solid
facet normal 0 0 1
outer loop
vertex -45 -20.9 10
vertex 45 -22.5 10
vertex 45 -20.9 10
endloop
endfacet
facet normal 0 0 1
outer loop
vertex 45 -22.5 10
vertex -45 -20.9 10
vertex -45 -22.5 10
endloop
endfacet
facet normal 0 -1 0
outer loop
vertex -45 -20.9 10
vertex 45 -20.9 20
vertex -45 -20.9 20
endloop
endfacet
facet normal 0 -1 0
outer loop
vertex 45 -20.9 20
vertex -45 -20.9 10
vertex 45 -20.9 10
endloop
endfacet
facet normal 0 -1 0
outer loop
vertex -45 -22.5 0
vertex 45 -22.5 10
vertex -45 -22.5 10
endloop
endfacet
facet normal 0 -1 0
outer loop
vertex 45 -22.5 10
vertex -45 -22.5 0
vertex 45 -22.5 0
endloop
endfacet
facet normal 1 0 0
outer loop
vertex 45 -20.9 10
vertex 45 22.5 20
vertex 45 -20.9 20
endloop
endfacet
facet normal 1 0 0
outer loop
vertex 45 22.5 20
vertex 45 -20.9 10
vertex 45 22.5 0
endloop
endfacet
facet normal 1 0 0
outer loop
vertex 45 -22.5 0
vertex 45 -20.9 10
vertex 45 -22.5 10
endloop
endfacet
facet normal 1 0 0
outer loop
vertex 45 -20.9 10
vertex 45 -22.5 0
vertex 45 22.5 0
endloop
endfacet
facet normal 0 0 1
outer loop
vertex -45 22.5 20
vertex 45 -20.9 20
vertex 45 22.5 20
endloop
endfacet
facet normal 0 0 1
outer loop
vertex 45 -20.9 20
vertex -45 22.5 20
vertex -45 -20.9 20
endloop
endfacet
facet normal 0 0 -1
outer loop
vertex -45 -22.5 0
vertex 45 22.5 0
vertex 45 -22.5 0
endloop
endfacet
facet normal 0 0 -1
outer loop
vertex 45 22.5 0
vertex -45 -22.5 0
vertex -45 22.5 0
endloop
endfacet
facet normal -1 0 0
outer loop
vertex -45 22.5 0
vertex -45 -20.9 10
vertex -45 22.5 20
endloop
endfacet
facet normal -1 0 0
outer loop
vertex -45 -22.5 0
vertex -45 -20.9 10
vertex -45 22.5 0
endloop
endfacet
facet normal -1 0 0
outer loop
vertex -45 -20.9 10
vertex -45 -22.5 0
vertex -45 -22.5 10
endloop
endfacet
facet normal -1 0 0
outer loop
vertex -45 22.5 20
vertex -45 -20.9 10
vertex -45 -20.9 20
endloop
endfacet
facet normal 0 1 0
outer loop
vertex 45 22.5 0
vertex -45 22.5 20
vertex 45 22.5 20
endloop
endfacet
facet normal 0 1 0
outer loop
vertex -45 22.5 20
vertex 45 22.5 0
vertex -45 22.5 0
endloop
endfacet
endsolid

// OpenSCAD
// Microscope slide drying rack
// Print orientation: base on XY plane, slots open upward (+Z)

// ---- Block dimensions ----
block_len   = 90;    // block length along X
block_wid   = 45;    // block width along Y
block_ht    = 20;    // block height along Z

// ---- Slot dimensions ----
slot_count  = 10;    // number of slide slots
slot_len    = 77;    // slot length along X
slot_w      = 1.6;   // slot width along Y
slot_depth  = 10;    // slot depth into block (from top face)
slot_pitch  = 3.5;   // centre-to-centre spacing in Y

// ---- Cutting overlap ----
eps = 0.5;           // extension past cut faces to avoid coplanar faces

$fn = 64;

// X position of first slot so the group is centred on the block
slot_x0 = -(slot_count - 1) * slot_len / 2;

difference() {
    // Solid base block, centred in X and Y, resting on z = 0
    translate([-block_len / 2, -block_wid / 2, 0])
        cube([block_len, block_wid, block_ht]);

    // Parallel slots open at the top, running along X
    for (i = [0 : slot_count - 1])
        translate([slot_x0 + i * slot_len, -block_wid / 2, block_ht - slot_depth])
            cube([slot_len, slot_w, slot_depth + eps]);
}
